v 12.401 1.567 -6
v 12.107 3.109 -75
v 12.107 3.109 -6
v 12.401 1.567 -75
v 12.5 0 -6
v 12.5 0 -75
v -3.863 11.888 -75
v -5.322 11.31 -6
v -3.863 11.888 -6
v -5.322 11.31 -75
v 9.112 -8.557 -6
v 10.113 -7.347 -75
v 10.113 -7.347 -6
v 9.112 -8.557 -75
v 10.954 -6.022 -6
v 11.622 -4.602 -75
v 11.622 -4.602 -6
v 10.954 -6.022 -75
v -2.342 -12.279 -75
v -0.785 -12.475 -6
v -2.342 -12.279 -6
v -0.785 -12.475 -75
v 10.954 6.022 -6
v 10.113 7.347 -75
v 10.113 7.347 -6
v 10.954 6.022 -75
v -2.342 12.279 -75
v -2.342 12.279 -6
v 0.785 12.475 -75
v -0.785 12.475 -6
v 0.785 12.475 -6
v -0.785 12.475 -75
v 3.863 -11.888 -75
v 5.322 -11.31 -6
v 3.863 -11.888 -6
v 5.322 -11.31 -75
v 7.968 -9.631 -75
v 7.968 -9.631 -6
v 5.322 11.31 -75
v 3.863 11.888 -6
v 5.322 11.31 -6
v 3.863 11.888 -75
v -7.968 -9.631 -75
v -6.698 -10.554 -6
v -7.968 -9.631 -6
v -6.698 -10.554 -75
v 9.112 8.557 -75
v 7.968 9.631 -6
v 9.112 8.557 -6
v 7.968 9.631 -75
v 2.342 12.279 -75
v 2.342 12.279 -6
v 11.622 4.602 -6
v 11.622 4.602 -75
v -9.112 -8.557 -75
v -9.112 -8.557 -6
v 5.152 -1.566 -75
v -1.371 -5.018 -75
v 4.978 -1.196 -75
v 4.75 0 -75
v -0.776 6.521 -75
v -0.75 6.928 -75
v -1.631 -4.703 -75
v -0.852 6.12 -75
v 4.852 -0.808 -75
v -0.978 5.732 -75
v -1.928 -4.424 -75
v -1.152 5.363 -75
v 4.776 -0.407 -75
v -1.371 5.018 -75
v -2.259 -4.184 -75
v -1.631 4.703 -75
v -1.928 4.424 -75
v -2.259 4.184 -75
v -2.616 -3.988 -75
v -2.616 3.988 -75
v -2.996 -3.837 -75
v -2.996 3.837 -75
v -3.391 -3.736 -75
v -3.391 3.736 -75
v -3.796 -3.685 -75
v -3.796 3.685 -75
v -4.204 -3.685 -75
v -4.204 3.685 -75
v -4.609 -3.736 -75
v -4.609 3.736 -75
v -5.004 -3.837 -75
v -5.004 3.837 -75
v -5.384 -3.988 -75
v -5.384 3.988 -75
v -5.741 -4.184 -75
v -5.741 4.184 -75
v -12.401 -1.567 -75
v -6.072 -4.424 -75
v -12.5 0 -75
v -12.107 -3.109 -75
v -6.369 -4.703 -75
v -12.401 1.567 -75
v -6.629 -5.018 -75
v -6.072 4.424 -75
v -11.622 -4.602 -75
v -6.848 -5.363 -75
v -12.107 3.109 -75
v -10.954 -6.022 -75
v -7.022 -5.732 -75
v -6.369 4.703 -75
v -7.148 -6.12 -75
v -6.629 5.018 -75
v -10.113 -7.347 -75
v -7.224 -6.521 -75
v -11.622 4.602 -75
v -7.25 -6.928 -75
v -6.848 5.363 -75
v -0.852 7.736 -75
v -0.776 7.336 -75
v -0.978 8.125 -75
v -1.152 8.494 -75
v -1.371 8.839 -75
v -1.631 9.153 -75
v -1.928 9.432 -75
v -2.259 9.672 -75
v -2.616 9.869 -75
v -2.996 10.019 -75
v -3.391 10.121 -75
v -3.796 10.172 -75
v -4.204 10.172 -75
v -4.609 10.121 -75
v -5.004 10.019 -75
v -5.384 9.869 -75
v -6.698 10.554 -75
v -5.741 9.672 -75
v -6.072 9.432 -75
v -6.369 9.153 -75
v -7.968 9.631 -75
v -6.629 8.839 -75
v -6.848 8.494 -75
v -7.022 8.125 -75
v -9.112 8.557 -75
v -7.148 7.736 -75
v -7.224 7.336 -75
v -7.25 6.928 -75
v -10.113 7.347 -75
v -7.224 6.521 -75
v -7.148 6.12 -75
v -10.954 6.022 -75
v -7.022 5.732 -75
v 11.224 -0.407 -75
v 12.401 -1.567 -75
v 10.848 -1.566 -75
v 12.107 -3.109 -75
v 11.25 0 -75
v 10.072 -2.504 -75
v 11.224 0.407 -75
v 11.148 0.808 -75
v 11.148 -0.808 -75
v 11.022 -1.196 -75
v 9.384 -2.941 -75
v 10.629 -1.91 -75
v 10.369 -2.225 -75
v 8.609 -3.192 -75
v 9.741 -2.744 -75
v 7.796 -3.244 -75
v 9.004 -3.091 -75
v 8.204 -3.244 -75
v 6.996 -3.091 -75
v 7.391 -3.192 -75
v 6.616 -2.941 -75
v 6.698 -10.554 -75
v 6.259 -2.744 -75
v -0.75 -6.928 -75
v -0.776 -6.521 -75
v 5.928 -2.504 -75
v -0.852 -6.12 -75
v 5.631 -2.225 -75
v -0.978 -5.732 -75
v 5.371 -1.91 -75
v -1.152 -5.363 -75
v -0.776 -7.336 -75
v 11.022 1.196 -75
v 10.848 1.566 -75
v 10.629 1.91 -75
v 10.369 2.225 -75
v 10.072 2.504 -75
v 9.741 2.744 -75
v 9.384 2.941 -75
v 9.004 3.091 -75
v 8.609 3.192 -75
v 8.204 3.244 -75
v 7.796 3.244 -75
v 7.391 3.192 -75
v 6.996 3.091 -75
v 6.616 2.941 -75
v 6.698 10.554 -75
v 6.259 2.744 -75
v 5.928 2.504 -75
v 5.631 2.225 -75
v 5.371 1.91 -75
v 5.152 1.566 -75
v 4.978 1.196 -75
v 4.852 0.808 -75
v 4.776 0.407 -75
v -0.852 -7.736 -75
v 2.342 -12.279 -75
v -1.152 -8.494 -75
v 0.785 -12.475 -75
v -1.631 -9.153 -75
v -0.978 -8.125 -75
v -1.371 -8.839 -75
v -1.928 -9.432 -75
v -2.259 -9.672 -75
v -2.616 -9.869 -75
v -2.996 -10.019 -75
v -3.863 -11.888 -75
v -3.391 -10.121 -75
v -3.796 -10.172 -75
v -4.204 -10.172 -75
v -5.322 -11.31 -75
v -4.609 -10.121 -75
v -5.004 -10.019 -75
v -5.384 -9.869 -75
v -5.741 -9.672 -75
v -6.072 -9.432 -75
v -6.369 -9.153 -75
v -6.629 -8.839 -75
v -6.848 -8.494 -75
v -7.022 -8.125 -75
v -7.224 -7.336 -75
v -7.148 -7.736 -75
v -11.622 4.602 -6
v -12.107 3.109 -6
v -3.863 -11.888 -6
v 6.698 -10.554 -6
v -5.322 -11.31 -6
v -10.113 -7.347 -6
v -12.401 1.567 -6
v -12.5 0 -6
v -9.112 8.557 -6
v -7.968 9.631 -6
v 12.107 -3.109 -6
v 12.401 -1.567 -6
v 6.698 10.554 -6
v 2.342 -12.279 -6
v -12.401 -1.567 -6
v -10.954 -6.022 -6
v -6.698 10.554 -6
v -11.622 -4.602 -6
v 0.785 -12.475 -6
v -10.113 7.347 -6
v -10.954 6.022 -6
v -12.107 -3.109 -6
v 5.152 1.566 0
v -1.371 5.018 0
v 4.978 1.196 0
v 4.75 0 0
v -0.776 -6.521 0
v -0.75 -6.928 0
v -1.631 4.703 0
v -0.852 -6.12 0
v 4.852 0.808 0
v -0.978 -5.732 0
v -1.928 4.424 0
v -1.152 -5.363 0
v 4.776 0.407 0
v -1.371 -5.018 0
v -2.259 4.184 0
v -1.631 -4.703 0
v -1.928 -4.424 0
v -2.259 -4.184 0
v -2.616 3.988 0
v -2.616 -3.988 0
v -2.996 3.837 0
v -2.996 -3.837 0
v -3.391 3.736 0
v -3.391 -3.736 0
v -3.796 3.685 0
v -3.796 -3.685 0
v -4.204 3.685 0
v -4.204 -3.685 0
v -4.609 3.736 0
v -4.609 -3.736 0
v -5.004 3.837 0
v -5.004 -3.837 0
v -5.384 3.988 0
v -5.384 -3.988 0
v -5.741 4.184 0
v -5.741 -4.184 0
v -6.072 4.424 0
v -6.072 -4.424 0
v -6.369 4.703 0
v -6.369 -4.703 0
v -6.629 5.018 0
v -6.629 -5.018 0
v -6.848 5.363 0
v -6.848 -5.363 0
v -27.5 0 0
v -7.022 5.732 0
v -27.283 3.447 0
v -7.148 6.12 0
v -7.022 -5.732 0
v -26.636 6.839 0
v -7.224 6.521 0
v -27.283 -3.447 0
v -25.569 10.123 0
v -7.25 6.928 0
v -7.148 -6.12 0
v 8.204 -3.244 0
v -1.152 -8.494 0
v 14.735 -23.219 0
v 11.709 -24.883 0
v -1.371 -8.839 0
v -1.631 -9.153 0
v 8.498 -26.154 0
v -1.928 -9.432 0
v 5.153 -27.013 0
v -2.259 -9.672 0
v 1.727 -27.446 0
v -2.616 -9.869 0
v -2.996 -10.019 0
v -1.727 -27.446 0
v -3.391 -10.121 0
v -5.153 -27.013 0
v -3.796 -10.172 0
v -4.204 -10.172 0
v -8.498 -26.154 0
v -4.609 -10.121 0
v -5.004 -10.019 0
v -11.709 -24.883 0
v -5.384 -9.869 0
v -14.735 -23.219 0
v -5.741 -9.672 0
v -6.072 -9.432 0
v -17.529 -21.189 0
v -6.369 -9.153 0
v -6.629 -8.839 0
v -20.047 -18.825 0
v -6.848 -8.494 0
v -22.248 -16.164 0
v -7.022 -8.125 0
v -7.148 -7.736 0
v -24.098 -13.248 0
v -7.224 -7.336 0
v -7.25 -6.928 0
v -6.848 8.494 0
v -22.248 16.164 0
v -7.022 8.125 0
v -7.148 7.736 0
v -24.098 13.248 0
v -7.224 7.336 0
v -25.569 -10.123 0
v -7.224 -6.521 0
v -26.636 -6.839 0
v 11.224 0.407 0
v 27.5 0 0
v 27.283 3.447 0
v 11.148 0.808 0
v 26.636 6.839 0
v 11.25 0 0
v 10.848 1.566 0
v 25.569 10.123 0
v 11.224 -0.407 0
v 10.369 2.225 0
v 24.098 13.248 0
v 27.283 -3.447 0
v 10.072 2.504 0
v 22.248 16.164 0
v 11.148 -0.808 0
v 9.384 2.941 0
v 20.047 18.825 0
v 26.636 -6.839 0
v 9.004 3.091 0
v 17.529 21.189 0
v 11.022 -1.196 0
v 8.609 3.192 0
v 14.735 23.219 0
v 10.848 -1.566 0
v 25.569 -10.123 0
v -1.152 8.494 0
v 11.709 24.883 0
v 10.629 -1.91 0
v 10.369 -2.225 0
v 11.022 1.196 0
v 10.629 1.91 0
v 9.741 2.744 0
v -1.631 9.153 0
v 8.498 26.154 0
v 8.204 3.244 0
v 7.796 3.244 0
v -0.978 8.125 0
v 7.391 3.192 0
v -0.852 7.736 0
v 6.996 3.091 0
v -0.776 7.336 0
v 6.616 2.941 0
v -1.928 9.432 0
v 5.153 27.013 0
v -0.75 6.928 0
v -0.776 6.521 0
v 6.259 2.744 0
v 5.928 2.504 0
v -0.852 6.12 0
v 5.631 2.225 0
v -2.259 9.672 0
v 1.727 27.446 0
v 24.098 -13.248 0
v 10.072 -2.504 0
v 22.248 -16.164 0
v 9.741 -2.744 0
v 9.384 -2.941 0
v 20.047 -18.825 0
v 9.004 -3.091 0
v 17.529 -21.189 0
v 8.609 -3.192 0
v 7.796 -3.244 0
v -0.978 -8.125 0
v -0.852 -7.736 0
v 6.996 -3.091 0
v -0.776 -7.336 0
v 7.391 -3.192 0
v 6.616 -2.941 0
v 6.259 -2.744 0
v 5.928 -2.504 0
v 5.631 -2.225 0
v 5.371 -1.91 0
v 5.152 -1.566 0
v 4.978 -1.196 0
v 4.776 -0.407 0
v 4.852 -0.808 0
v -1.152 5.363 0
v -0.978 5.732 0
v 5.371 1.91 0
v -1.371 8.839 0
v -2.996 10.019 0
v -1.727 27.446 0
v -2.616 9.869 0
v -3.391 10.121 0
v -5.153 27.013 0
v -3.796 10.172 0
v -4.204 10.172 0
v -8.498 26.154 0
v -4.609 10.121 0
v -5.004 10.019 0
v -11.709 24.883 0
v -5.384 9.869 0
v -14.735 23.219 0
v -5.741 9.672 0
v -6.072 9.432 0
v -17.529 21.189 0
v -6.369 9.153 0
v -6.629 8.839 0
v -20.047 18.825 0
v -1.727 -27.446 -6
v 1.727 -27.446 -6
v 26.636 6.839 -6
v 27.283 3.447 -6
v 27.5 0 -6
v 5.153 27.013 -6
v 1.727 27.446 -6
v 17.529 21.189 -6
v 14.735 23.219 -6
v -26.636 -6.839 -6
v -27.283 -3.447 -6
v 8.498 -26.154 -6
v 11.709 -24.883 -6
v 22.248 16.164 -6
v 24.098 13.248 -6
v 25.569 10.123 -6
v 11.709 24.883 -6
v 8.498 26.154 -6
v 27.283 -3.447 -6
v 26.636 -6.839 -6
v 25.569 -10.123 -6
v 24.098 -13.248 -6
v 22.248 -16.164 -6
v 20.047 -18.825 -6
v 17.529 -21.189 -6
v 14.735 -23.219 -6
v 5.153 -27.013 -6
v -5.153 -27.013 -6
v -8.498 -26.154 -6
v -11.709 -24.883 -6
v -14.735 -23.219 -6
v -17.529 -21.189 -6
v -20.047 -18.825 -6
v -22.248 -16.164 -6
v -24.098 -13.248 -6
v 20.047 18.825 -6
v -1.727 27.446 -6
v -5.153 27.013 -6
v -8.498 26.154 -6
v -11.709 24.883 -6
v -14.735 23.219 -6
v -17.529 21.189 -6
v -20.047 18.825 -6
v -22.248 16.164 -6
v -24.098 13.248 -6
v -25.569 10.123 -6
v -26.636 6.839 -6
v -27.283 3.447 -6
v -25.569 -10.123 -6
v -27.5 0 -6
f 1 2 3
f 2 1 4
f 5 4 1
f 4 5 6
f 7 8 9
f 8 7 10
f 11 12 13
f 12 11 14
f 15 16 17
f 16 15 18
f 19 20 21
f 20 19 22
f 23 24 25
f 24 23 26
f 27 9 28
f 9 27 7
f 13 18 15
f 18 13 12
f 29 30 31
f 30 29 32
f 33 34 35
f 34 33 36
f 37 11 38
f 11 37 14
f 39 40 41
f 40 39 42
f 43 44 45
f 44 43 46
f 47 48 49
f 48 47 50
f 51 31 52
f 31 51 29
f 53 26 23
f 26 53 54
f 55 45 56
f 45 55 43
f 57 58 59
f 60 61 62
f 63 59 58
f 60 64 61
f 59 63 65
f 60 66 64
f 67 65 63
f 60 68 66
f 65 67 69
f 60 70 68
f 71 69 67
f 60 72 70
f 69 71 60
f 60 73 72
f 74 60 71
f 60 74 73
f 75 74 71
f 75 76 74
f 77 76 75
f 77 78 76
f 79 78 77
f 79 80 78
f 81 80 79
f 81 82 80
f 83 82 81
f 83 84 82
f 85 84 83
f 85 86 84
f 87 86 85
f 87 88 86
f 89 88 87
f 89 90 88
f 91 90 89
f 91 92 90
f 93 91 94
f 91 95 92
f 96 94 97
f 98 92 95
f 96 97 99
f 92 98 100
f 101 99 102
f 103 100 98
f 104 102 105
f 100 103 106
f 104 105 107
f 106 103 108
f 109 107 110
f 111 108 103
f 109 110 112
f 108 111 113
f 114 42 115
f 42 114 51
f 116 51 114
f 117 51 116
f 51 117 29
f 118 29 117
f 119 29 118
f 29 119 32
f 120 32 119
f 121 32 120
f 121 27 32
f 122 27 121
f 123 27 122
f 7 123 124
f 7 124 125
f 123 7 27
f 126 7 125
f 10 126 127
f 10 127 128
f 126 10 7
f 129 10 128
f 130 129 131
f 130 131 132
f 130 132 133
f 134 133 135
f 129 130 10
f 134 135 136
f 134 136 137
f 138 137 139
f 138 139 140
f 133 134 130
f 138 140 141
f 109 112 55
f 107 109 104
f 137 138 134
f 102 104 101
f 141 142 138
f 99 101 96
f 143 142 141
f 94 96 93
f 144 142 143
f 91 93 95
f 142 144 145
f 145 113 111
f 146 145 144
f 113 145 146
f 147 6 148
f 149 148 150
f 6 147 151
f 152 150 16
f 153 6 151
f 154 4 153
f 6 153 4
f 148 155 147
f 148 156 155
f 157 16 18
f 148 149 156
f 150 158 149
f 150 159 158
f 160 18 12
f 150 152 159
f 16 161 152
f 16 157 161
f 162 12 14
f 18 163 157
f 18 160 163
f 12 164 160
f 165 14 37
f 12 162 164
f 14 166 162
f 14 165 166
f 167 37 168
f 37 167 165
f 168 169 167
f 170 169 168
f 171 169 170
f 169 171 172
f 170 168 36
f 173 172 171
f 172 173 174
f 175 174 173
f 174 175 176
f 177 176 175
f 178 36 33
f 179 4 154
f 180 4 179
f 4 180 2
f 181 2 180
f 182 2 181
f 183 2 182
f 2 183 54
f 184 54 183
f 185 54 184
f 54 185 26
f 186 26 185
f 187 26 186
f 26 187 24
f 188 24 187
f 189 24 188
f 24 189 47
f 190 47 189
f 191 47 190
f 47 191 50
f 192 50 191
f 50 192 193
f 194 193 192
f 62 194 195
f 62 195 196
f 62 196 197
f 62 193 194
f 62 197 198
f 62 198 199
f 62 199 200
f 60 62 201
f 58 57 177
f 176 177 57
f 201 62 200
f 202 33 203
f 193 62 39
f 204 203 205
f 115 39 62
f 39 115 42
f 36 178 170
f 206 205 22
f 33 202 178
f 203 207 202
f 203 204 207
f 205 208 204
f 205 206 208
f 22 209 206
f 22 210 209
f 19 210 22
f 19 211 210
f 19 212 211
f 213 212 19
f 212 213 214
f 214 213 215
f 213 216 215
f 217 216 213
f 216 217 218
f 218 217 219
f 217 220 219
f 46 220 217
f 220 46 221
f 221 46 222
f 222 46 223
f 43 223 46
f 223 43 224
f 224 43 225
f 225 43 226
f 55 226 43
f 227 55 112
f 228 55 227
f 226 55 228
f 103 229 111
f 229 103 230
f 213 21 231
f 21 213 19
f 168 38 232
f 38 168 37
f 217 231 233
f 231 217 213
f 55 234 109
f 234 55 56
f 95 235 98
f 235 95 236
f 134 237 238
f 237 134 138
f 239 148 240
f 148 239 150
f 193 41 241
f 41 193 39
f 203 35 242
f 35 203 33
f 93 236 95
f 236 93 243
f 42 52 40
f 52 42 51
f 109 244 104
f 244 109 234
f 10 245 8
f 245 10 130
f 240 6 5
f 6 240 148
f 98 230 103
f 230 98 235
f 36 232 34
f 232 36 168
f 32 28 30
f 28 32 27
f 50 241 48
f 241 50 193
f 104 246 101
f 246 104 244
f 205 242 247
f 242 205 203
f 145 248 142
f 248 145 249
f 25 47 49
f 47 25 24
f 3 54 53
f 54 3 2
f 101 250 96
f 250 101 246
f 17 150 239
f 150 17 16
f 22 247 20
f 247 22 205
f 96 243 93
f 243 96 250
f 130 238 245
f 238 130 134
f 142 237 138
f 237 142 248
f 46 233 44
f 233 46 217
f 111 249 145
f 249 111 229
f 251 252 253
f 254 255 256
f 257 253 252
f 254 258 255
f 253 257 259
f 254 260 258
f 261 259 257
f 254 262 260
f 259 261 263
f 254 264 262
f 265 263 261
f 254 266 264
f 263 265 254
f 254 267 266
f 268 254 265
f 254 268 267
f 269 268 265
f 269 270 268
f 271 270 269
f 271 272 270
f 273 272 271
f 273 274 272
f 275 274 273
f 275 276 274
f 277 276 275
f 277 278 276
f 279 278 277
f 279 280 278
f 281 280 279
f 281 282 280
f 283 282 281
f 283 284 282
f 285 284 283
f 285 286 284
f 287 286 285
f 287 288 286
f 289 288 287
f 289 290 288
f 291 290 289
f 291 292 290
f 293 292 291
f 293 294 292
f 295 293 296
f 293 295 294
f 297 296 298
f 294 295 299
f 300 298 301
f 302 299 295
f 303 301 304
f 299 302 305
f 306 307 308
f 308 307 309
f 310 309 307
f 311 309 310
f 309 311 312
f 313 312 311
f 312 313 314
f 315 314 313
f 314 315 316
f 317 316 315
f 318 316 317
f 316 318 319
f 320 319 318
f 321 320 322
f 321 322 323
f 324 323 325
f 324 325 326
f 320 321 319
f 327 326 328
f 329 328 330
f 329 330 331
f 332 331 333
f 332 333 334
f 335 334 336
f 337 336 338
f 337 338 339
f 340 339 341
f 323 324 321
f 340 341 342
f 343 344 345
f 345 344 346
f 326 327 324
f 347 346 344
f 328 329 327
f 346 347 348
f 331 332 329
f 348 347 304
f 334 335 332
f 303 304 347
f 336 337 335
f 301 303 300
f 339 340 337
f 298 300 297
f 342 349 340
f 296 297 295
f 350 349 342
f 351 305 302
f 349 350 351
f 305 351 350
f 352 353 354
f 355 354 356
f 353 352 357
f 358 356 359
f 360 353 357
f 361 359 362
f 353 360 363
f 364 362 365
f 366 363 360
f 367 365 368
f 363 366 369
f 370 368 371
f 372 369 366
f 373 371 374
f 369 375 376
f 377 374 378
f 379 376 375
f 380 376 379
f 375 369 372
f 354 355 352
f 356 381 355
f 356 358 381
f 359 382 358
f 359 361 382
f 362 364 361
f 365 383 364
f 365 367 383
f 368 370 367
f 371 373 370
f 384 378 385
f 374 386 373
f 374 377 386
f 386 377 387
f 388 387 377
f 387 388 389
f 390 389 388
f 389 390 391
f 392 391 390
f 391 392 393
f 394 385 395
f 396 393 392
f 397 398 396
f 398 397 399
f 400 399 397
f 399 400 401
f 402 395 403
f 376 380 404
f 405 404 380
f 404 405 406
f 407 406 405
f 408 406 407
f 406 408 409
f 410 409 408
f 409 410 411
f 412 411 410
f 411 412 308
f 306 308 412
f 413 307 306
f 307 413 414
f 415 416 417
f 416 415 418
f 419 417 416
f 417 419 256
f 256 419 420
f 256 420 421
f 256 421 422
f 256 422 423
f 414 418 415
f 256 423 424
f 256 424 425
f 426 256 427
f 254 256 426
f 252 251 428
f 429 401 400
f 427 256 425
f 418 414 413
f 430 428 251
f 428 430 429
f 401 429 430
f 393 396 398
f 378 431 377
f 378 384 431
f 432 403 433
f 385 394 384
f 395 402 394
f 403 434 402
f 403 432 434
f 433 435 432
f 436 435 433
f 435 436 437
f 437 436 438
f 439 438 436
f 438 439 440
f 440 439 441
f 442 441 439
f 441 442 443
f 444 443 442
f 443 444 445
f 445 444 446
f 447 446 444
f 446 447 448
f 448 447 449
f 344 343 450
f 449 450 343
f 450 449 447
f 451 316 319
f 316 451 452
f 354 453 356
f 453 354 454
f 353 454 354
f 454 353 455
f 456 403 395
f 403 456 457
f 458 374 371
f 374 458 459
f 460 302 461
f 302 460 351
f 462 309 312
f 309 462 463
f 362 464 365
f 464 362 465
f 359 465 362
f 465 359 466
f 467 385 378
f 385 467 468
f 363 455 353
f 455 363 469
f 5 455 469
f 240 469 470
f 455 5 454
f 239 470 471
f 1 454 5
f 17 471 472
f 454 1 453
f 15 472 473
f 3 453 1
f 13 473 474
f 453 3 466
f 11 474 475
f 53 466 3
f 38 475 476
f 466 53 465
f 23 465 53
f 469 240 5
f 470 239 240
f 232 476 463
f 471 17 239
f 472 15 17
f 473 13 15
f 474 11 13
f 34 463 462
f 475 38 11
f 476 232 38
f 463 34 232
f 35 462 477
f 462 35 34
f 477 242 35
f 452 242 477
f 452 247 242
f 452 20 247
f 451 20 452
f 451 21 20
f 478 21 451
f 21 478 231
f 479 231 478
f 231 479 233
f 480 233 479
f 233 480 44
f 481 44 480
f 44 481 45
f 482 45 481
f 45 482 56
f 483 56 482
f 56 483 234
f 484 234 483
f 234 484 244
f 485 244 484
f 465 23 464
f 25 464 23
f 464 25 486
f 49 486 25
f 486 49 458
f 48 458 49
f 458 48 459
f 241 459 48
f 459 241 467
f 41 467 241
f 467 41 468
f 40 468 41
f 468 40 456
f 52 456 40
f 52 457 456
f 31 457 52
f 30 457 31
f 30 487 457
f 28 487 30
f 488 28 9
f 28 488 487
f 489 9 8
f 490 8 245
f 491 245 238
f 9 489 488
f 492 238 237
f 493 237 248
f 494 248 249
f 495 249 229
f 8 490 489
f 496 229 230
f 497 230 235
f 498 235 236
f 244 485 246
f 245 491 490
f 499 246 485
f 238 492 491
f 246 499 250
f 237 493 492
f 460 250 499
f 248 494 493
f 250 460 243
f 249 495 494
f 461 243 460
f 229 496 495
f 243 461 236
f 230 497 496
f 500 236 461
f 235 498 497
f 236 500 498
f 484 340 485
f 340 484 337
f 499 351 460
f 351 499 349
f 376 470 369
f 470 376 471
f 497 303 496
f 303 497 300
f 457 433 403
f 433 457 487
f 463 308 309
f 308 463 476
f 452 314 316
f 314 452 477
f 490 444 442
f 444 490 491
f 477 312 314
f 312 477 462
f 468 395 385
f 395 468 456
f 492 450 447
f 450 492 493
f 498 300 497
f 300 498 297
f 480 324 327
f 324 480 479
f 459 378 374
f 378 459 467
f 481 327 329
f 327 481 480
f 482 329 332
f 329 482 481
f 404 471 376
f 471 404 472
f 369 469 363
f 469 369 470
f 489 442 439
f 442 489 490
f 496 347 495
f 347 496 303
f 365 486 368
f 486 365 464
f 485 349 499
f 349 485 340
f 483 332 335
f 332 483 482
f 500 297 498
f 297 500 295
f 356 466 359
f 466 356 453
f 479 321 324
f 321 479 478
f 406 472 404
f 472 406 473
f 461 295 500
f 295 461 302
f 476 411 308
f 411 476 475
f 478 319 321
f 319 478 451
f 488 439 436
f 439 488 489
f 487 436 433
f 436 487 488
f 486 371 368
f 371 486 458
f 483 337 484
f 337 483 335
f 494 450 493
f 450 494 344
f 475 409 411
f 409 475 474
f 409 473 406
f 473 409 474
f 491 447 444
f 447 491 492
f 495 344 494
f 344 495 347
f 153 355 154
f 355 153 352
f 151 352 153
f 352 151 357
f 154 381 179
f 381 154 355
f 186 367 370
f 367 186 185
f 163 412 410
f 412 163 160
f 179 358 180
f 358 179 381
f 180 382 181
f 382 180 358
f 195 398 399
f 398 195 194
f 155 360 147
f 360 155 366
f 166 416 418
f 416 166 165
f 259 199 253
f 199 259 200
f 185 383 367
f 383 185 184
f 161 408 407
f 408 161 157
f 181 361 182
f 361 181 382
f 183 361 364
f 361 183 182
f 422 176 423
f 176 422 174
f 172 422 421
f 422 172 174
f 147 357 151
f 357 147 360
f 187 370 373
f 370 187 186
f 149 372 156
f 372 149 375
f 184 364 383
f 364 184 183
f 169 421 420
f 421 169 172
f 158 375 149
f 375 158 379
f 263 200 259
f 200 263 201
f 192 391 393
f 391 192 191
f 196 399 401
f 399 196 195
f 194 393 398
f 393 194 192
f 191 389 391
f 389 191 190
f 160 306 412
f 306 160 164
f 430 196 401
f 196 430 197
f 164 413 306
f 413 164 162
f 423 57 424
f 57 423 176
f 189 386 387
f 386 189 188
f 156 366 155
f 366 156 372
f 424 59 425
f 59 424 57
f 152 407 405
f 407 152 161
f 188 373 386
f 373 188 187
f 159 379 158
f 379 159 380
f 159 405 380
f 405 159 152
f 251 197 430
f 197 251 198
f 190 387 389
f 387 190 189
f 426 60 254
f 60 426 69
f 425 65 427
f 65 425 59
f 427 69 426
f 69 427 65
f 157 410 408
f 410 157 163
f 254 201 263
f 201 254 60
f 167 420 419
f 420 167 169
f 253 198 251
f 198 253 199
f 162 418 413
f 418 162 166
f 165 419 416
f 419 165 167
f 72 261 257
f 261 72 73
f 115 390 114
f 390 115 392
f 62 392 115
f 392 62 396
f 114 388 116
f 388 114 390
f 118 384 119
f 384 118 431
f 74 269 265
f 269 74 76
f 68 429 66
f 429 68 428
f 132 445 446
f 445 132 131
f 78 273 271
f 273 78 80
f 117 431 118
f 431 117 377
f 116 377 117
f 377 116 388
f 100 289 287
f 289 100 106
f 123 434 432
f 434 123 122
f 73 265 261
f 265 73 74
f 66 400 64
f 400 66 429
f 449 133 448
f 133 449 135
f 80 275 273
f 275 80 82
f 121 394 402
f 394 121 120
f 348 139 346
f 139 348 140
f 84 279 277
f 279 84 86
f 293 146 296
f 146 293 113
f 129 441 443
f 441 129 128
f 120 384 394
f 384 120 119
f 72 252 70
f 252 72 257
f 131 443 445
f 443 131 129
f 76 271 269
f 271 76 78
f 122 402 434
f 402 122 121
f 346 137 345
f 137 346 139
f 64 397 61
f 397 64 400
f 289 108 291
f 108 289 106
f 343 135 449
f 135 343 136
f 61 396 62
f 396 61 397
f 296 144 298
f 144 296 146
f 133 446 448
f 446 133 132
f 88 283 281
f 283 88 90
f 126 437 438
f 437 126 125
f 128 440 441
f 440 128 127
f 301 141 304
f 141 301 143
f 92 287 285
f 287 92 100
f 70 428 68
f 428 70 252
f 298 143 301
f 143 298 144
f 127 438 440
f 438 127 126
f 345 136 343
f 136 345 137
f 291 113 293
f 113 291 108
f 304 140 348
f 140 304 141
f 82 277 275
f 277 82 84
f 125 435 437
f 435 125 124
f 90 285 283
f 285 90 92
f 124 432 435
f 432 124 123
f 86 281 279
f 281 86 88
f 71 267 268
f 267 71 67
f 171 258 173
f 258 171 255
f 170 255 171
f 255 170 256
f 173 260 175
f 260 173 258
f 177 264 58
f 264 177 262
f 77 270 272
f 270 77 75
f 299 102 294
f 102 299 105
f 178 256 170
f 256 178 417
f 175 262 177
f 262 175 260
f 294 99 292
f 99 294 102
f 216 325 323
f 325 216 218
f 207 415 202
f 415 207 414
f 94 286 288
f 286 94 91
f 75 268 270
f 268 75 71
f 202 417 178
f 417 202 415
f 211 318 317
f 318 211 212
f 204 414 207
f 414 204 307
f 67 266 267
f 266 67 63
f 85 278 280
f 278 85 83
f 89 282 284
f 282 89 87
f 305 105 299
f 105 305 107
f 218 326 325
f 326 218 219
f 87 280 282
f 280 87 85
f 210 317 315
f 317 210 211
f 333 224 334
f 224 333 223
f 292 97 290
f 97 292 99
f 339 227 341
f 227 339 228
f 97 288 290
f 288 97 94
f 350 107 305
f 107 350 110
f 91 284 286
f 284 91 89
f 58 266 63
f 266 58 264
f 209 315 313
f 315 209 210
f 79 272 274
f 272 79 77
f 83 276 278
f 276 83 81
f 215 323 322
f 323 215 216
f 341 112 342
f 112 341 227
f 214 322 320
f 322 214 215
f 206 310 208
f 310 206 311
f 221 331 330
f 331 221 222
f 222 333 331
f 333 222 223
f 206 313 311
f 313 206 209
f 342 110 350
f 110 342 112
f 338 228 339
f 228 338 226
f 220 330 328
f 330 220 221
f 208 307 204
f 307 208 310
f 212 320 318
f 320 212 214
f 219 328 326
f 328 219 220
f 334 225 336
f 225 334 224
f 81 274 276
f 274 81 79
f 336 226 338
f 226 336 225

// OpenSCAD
$fn = 50;


difference() {
	union() {
		translate(v = [0, 0, -75.0000000000]) {
			cylinder(h = 75, r = 12.5000000000);
		}
		translate(v = [0, 0, -6.0000000000]) {
			cylinder(h = 6, r = 27.5000000000);
		}
	}
	union() {
		#translate(v = [8.0000000000, 0.0000000000, -75]) {
			cylinder(h = 75, r = 3.2500000000);
		}
		#translate(v = [-4.0000000000, 6.9282032303, -75]) {
			cylinder(h = 75, r = 3.2500000000);
		}
		#translate(v = [-4.0000000000, -6.9282032303, -75]) {
			cylinder(h = 75, r = 3.2500000000);
		}
	}
}
